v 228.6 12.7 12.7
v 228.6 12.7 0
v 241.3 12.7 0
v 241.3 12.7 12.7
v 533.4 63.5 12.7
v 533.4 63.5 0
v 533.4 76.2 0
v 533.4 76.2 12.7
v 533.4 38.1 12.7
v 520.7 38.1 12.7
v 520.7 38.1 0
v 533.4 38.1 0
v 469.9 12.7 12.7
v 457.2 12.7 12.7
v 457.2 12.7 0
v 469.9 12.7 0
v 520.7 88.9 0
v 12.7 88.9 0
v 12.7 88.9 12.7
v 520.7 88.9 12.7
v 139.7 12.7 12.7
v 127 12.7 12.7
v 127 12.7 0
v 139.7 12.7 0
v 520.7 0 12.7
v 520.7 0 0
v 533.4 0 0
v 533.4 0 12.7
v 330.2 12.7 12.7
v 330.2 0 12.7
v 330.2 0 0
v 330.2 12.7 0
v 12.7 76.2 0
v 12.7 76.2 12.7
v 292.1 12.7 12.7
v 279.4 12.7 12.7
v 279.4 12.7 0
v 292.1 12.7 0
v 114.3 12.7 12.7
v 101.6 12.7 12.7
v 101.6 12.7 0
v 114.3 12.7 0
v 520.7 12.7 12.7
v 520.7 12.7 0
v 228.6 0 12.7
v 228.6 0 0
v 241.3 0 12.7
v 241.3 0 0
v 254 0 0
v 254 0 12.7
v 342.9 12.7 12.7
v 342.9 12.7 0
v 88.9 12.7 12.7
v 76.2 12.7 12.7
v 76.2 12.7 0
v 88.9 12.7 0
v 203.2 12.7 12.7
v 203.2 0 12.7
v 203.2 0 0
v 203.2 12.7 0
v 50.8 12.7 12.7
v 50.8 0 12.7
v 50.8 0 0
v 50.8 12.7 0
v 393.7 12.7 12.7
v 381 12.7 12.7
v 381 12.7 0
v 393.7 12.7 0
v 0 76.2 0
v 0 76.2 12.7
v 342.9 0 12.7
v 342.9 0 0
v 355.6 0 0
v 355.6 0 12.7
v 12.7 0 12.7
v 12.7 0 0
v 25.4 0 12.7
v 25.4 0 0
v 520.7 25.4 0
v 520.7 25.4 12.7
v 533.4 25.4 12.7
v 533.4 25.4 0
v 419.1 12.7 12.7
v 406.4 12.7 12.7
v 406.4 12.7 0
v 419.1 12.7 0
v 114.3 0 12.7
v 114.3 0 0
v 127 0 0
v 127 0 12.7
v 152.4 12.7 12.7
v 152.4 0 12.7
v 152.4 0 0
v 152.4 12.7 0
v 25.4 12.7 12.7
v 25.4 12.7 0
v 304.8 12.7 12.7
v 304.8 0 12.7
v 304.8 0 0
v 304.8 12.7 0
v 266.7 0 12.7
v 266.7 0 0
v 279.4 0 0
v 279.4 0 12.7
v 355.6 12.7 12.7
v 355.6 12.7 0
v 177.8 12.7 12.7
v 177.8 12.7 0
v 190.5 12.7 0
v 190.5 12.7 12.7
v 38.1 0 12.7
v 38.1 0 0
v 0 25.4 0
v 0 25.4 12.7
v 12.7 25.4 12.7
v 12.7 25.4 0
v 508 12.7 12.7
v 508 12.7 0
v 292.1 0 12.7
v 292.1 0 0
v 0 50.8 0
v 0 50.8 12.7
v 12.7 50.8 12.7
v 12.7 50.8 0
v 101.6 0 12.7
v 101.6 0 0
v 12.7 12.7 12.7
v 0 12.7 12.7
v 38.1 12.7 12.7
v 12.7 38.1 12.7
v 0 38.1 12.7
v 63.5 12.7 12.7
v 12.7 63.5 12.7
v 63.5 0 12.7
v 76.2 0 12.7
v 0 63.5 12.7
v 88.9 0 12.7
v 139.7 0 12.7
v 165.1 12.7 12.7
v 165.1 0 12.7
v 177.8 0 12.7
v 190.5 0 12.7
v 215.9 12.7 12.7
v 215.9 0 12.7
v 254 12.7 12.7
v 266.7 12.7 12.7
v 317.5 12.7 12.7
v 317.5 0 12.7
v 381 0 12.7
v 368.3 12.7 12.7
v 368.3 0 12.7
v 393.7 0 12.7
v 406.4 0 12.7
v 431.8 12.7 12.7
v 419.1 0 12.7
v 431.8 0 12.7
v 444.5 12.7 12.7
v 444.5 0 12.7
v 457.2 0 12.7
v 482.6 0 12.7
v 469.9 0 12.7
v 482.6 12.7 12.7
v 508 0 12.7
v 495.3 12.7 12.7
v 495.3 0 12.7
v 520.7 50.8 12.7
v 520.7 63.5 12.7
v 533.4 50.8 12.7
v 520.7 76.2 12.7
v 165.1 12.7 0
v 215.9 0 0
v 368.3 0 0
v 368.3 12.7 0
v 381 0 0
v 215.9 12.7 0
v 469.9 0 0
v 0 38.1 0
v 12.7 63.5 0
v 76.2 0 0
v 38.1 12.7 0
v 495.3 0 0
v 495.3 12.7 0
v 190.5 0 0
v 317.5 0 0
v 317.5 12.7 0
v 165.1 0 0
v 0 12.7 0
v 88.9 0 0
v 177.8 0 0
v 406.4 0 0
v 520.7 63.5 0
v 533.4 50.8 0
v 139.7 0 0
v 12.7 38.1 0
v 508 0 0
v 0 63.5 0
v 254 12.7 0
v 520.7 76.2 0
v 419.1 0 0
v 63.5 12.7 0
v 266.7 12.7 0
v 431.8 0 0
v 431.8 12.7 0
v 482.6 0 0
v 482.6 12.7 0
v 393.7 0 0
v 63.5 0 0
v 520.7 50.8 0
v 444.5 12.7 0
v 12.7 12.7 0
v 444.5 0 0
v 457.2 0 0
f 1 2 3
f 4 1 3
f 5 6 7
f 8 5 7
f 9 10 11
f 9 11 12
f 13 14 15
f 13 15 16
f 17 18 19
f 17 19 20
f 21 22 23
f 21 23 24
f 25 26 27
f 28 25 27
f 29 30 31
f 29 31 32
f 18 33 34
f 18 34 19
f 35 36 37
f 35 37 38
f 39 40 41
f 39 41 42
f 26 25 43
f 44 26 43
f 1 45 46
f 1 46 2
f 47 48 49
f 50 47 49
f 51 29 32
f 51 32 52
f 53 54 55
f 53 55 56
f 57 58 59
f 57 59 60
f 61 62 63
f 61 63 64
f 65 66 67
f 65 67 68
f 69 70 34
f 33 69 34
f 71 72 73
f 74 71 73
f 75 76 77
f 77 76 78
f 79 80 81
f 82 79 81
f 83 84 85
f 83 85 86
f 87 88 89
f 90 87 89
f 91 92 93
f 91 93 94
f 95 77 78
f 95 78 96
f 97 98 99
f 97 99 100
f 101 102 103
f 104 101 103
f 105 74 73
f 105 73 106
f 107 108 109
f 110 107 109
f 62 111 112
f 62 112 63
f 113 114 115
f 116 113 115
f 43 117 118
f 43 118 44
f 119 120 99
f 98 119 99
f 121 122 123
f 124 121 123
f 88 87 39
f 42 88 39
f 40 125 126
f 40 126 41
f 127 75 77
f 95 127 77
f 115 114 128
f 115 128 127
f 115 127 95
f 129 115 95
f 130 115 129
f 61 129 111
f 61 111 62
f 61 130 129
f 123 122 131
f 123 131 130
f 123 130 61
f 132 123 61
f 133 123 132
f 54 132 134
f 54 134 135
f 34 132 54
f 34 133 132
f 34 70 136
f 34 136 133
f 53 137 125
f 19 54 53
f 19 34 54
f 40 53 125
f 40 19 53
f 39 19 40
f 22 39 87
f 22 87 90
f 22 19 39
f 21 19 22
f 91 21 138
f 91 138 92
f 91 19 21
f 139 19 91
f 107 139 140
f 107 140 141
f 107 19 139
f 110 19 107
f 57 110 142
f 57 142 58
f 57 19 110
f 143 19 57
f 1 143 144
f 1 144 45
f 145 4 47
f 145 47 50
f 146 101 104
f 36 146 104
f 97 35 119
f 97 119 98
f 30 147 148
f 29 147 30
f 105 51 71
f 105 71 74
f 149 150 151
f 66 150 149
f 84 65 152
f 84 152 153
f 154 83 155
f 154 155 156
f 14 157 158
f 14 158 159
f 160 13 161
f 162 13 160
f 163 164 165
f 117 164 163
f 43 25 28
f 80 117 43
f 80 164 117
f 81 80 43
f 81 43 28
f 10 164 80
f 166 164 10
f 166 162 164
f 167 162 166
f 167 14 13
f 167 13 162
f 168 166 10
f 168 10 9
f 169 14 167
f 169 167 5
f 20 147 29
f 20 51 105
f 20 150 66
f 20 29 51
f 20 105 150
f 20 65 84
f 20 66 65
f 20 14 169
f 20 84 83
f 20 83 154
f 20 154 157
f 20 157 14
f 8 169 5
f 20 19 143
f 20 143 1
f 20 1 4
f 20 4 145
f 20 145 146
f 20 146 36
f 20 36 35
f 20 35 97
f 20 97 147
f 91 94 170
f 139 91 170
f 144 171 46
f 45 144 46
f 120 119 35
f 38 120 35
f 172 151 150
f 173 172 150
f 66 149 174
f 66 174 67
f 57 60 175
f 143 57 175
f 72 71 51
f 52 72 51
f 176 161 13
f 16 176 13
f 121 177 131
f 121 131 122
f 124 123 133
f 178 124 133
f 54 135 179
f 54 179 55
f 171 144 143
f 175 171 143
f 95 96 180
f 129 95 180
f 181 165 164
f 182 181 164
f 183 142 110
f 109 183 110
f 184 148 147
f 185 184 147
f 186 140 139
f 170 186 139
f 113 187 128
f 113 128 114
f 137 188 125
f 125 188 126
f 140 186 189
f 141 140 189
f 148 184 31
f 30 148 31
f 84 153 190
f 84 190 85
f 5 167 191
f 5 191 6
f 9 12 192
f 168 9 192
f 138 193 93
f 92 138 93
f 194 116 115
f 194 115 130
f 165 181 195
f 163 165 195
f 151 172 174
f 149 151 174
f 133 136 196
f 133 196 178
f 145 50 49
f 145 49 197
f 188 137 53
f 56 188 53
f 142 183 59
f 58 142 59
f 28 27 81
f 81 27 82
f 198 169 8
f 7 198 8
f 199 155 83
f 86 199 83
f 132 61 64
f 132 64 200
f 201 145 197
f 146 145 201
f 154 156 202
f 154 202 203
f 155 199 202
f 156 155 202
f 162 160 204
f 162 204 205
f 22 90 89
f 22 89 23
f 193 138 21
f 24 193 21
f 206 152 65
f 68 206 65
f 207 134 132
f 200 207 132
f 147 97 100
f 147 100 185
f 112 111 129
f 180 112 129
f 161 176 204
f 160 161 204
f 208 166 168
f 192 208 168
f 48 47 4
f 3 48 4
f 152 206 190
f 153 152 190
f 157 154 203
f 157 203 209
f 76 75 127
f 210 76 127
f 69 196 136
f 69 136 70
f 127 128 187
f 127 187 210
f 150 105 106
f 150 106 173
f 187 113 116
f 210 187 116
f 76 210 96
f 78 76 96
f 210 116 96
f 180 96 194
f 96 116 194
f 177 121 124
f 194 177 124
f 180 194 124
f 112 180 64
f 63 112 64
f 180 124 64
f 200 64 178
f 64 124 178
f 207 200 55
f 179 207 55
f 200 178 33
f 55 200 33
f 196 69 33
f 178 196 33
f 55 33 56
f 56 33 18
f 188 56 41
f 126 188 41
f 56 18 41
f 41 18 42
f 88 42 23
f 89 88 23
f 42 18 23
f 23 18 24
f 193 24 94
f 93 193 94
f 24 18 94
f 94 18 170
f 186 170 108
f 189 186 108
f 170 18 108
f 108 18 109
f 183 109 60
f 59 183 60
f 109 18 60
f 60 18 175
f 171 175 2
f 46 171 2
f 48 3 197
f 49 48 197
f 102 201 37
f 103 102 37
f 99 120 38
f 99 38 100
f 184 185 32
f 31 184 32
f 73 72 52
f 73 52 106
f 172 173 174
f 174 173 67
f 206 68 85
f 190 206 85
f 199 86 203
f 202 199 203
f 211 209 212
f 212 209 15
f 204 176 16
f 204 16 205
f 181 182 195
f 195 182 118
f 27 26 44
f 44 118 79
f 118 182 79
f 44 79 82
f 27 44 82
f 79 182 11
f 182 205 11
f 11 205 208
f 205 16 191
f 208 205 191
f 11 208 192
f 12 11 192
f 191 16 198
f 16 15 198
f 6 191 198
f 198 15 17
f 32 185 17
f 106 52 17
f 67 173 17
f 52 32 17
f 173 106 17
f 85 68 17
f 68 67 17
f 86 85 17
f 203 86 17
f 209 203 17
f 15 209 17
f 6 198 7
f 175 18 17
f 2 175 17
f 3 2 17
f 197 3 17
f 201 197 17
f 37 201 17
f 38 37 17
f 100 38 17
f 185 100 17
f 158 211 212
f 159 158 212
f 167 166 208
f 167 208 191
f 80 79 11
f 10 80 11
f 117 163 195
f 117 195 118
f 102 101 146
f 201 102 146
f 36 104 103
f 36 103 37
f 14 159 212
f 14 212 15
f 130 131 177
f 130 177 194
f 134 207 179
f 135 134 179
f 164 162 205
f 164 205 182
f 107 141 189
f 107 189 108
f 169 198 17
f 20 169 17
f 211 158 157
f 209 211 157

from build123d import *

# Parameters (mm, degrees)
F0_W     = 533.4
F0_H     = 88.9
F1_DEPTH = 12.7
F2_W     = 12.7
F2_H     = 12.7
F3_DEPTH = 25.4
F4_W     = 12.7
F4_H     = 12.7
F5_DEPTH = 25.4
F6_W     = 12.7
F6_H     = 12.7
F7_DEPTH = 25.4


with BuildPart() as f1:
    # F0 (on Top) → F1 (new body)
    with BuildSketch(Plane.XY):
        with Locations((266.7, 44.45)):
            Rectangle(F0_W, F0_H)
    extrude(amount=F1_DEPTH)

    # F2 (on face) → F3 (cut)
    with BuildSketch(Plane.XY.offset(12.7)):
        with Locations((6.35, 6.35)):
            Rectangle(F2_W, F2_H)
        with Locations((6.35, 31.75)):
            Rectangle(F2_W, F2_H)
        with Locations((6.35, 82.55)):
            Rectangle(F2_W, F2_H)
        with Locations((6.35, 57.15)):
            Rectangle(F2_W, F2_H)
    extrude(amount=-F3_DEPTH, mode=Mode.SUBTRACT)

    # F4 (on face) → F5 (cut)
    with BuildSketch(Plane.XY.offset(12.7)):
        with Locations((82.55, 6.35)):
            Rectangle(F4_W, F4_H)
        with Locations((133.35, 6.35)):
            Rectangle(F4_W, F4_H)
        with Locations((158.75, 6.35)):
            Rectangle(F4_W, F4_H)
        with Locations((184.15, 6.35)):
            Rectangle(F4_W, F4_H)
        with Locations((57.15, 6.35)):
            Rectangle(F4_W, F4_H)
        with Locations((31.75, 6.35)):
            Rectangle(F4_W, F4_H)
        with Locations((107.95, 6.35)):
            Rectangle(F4_W, F4_H)
        with Locations((209.55, 6.35)):
            Rectangle(F4_W, F4_H)
        with Locations((234.95, 6.35)):
            Rectangle(F4_W, F4_H)
        with Locations((260.35, 6.35)):
            Rectangle(F4_W, F4_H)
        with Locations((285.75, 6.35)):
            Rectangle(F4_W, F4_H)
        with Locations((311.15, 6.35)):
            Rectangle(F4_W, F4_H)
        with Locations((336.55, 6.35)):
            Rectangle(F4_W, F4_H)
        with Locations((361.95, 6.35)):
            Rectangle(F4_W, F4_H)
        with Locations((387.35, 6.35)):
            Rectangle(F4_W, F4_H)
        with Locations((412.75, 6.35)):
            Rectangle(F4_W, F4_H)
        with Locations((438.15, 6.35)):
            Rectangle(F4_W, F4_H)
        with Locations((463.55, 6.35)):
            Rectangle(F4_W, F4_H)
        with Locations((488.95, 6.35)):
            Rectangle(F4_W, F4_H)
        with Locations((514.35, 6.35)):
            Rectangle(F4_W, F4_H)
    extrude(amount=-F5_DEPTH, mode=Mode.SUBTRACT)

    # F6 (on face) → F7 (cut)
    with BuildSketch(Plane.XY.offset(12.7)):
        with Locations((527.05, 82.55)):
            Rectangle(F6_W, F6_H)
        with Locations((527.05, 57.15)):
            Rectangle(F6_W, F6_H)
        with Locations((527.05, 31.75)):
            Rectangle(F6_W, F6_H)
    extrude(amount=-F7_DEPTH, mode=Mode.SUBTRACT)


solid = f1.part
